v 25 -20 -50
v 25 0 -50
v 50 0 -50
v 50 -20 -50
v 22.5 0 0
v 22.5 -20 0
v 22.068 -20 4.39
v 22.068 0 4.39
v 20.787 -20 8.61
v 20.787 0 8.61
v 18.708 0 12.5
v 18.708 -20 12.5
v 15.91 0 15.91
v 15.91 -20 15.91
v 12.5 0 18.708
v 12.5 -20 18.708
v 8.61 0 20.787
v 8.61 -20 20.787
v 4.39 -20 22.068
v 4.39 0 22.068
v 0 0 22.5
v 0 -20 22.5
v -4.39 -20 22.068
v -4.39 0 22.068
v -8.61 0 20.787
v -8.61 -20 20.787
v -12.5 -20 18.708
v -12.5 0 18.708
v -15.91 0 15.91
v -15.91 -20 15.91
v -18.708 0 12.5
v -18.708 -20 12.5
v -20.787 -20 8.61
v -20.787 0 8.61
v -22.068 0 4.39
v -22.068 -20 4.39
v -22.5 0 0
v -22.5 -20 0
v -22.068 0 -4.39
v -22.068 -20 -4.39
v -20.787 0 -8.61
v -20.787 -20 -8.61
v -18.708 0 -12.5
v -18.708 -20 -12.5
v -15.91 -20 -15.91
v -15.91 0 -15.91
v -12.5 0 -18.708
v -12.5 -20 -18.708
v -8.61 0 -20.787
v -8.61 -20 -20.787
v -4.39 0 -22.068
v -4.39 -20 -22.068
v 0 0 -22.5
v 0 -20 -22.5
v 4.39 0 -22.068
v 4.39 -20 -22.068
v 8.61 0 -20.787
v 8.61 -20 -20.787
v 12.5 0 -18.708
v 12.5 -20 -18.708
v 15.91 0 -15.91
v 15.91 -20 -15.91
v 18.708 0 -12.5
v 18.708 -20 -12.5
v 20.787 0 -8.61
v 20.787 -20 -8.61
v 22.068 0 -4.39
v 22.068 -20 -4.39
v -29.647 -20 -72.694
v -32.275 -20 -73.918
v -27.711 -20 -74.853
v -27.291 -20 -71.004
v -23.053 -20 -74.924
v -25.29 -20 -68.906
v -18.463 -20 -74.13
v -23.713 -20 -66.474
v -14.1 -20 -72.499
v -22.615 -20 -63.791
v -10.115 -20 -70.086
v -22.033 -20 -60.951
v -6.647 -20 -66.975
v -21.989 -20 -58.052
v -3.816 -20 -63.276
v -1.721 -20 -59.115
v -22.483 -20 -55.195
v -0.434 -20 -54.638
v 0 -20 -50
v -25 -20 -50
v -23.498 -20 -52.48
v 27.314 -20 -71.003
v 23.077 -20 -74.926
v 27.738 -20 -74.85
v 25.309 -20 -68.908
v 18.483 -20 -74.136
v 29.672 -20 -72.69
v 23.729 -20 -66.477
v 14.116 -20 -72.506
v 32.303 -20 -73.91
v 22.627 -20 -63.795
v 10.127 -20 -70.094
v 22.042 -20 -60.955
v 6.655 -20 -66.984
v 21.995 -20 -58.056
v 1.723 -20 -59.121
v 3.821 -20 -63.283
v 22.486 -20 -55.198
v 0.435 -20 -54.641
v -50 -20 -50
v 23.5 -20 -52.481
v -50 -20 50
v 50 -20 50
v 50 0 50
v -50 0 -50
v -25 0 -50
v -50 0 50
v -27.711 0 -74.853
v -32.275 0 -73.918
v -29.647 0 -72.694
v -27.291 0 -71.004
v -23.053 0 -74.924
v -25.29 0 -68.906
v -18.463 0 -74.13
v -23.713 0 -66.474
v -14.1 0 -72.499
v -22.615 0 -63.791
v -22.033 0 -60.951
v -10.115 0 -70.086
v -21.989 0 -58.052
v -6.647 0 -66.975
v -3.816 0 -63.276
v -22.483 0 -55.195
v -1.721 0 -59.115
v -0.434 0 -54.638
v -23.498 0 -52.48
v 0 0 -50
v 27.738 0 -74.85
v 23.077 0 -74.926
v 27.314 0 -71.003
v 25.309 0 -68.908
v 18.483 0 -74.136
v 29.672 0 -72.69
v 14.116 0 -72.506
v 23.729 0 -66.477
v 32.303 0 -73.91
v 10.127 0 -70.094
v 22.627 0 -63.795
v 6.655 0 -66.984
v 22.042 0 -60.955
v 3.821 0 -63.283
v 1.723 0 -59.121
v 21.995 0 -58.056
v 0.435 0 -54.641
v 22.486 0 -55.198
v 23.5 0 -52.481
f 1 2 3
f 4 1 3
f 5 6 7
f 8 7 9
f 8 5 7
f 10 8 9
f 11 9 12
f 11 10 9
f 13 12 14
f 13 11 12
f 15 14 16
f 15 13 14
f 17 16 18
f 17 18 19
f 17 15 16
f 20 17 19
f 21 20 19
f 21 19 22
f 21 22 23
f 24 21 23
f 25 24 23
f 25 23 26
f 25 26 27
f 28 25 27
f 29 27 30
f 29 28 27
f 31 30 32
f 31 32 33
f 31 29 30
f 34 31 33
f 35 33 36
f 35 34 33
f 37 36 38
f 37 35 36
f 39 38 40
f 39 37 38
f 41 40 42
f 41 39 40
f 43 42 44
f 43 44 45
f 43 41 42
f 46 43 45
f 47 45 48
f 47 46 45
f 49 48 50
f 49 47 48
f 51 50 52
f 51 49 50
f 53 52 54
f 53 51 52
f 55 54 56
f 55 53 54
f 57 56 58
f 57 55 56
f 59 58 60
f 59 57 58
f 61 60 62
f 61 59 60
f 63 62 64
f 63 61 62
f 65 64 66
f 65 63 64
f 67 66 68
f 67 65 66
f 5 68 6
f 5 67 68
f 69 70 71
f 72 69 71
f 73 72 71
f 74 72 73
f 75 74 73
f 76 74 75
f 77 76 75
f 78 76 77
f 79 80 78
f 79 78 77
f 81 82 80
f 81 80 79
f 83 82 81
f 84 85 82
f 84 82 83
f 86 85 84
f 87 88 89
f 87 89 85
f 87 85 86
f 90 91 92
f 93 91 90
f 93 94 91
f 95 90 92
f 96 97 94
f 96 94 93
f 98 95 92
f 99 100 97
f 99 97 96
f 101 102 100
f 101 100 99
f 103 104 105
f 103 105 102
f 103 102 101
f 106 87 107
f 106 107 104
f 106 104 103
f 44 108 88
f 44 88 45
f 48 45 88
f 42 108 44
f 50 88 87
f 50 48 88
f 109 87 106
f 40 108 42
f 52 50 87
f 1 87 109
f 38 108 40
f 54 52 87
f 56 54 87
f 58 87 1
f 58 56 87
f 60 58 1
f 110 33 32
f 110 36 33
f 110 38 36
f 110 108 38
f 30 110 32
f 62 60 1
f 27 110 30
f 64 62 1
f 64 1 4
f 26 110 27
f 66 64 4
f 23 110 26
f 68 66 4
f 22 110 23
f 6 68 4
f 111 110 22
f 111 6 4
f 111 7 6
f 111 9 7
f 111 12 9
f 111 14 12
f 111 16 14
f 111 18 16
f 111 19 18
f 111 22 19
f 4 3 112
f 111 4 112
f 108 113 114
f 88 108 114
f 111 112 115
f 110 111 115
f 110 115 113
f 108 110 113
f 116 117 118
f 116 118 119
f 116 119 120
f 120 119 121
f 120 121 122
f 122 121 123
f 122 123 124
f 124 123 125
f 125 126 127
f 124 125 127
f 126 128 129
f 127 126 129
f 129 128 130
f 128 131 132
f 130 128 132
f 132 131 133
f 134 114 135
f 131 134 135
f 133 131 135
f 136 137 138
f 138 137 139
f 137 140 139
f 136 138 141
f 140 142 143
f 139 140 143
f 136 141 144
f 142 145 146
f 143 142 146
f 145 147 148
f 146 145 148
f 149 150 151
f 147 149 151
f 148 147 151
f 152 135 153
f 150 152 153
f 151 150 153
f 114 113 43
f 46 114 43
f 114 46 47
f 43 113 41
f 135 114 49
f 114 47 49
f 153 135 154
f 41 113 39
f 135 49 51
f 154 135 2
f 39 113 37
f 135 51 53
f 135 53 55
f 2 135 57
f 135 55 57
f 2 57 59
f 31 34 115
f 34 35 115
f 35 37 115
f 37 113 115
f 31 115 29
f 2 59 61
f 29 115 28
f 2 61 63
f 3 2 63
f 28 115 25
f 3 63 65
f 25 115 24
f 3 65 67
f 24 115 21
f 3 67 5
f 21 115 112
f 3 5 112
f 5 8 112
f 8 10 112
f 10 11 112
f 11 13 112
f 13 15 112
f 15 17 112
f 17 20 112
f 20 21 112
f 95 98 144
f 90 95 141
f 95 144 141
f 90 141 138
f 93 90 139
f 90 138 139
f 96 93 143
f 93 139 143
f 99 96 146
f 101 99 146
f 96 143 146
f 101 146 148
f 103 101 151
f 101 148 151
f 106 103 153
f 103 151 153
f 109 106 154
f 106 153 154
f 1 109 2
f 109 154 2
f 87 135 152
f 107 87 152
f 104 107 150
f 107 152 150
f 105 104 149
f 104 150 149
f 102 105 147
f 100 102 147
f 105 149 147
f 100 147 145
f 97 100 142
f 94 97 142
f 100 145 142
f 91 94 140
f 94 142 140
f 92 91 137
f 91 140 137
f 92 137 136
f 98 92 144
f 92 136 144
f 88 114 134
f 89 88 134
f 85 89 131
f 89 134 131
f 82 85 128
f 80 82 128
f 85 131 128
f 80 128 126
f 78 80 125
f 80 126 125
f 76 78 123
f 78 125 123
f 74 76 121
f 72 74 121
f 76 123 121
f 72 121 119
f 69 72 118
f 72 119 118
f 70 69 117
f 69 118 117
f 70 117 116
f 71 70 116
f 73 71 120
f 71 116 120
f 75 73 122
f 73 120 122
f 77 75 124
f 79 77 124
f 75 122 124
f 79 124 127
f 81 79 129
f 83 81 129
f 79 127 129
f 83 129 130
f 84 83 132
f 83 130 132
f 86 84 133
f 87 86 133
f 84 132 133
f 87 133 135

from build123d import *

# Parameters (mm, degrees)
F0_R     = 22.5
F1_DEPTH = 20


# Not quite as in the source:
# - a feature names something its author has since deleted; it is built from what else it names


with BuildPart() as f1:
    # F0 (on Front) → F1 (new body)
    with BuildSketch(Plane.XZ):
        Polygon((37.5, 50), (-40, 50), (-50, 50), (-50, 40), (-50, -40), (-50, -41.9841893017), (-50, -50), (-40, -50), (-25, -50), (0, -50), (25, -50), (40, -50), (50, -50), (50, -41.9841893017), (50, -40), (50, 40), (50, 50), (40, 50), align=None)
        Circle(F0_R, mode=Mode.SUBTRACT)
        with BuildLine():
            ThreePointArc((-25, -50), (-22.6149008919, -63.790810636), (-32.2747059634, -73.9181657563))
            ThreePointArc((-32.2747059634, -73.9181657563), (-10.1149008919, -70.0856621634), (0, -50))
            Line((0, -50), (-25, -50))
        make_face()
        with BuildLine():
            Line((25, -50), (0, -50))
            ThreePointArc((0, -50), (10.1268327857, -70.0944991731), (32.3031117614, -73.909507703))
            ThreePointArc((32.3031117614, -73.909507703), (22.6268327857, -63.7949935854), (25, -50))
        make_face()
    extrude(amount=F1_DEPTH)


solid = f1.part
